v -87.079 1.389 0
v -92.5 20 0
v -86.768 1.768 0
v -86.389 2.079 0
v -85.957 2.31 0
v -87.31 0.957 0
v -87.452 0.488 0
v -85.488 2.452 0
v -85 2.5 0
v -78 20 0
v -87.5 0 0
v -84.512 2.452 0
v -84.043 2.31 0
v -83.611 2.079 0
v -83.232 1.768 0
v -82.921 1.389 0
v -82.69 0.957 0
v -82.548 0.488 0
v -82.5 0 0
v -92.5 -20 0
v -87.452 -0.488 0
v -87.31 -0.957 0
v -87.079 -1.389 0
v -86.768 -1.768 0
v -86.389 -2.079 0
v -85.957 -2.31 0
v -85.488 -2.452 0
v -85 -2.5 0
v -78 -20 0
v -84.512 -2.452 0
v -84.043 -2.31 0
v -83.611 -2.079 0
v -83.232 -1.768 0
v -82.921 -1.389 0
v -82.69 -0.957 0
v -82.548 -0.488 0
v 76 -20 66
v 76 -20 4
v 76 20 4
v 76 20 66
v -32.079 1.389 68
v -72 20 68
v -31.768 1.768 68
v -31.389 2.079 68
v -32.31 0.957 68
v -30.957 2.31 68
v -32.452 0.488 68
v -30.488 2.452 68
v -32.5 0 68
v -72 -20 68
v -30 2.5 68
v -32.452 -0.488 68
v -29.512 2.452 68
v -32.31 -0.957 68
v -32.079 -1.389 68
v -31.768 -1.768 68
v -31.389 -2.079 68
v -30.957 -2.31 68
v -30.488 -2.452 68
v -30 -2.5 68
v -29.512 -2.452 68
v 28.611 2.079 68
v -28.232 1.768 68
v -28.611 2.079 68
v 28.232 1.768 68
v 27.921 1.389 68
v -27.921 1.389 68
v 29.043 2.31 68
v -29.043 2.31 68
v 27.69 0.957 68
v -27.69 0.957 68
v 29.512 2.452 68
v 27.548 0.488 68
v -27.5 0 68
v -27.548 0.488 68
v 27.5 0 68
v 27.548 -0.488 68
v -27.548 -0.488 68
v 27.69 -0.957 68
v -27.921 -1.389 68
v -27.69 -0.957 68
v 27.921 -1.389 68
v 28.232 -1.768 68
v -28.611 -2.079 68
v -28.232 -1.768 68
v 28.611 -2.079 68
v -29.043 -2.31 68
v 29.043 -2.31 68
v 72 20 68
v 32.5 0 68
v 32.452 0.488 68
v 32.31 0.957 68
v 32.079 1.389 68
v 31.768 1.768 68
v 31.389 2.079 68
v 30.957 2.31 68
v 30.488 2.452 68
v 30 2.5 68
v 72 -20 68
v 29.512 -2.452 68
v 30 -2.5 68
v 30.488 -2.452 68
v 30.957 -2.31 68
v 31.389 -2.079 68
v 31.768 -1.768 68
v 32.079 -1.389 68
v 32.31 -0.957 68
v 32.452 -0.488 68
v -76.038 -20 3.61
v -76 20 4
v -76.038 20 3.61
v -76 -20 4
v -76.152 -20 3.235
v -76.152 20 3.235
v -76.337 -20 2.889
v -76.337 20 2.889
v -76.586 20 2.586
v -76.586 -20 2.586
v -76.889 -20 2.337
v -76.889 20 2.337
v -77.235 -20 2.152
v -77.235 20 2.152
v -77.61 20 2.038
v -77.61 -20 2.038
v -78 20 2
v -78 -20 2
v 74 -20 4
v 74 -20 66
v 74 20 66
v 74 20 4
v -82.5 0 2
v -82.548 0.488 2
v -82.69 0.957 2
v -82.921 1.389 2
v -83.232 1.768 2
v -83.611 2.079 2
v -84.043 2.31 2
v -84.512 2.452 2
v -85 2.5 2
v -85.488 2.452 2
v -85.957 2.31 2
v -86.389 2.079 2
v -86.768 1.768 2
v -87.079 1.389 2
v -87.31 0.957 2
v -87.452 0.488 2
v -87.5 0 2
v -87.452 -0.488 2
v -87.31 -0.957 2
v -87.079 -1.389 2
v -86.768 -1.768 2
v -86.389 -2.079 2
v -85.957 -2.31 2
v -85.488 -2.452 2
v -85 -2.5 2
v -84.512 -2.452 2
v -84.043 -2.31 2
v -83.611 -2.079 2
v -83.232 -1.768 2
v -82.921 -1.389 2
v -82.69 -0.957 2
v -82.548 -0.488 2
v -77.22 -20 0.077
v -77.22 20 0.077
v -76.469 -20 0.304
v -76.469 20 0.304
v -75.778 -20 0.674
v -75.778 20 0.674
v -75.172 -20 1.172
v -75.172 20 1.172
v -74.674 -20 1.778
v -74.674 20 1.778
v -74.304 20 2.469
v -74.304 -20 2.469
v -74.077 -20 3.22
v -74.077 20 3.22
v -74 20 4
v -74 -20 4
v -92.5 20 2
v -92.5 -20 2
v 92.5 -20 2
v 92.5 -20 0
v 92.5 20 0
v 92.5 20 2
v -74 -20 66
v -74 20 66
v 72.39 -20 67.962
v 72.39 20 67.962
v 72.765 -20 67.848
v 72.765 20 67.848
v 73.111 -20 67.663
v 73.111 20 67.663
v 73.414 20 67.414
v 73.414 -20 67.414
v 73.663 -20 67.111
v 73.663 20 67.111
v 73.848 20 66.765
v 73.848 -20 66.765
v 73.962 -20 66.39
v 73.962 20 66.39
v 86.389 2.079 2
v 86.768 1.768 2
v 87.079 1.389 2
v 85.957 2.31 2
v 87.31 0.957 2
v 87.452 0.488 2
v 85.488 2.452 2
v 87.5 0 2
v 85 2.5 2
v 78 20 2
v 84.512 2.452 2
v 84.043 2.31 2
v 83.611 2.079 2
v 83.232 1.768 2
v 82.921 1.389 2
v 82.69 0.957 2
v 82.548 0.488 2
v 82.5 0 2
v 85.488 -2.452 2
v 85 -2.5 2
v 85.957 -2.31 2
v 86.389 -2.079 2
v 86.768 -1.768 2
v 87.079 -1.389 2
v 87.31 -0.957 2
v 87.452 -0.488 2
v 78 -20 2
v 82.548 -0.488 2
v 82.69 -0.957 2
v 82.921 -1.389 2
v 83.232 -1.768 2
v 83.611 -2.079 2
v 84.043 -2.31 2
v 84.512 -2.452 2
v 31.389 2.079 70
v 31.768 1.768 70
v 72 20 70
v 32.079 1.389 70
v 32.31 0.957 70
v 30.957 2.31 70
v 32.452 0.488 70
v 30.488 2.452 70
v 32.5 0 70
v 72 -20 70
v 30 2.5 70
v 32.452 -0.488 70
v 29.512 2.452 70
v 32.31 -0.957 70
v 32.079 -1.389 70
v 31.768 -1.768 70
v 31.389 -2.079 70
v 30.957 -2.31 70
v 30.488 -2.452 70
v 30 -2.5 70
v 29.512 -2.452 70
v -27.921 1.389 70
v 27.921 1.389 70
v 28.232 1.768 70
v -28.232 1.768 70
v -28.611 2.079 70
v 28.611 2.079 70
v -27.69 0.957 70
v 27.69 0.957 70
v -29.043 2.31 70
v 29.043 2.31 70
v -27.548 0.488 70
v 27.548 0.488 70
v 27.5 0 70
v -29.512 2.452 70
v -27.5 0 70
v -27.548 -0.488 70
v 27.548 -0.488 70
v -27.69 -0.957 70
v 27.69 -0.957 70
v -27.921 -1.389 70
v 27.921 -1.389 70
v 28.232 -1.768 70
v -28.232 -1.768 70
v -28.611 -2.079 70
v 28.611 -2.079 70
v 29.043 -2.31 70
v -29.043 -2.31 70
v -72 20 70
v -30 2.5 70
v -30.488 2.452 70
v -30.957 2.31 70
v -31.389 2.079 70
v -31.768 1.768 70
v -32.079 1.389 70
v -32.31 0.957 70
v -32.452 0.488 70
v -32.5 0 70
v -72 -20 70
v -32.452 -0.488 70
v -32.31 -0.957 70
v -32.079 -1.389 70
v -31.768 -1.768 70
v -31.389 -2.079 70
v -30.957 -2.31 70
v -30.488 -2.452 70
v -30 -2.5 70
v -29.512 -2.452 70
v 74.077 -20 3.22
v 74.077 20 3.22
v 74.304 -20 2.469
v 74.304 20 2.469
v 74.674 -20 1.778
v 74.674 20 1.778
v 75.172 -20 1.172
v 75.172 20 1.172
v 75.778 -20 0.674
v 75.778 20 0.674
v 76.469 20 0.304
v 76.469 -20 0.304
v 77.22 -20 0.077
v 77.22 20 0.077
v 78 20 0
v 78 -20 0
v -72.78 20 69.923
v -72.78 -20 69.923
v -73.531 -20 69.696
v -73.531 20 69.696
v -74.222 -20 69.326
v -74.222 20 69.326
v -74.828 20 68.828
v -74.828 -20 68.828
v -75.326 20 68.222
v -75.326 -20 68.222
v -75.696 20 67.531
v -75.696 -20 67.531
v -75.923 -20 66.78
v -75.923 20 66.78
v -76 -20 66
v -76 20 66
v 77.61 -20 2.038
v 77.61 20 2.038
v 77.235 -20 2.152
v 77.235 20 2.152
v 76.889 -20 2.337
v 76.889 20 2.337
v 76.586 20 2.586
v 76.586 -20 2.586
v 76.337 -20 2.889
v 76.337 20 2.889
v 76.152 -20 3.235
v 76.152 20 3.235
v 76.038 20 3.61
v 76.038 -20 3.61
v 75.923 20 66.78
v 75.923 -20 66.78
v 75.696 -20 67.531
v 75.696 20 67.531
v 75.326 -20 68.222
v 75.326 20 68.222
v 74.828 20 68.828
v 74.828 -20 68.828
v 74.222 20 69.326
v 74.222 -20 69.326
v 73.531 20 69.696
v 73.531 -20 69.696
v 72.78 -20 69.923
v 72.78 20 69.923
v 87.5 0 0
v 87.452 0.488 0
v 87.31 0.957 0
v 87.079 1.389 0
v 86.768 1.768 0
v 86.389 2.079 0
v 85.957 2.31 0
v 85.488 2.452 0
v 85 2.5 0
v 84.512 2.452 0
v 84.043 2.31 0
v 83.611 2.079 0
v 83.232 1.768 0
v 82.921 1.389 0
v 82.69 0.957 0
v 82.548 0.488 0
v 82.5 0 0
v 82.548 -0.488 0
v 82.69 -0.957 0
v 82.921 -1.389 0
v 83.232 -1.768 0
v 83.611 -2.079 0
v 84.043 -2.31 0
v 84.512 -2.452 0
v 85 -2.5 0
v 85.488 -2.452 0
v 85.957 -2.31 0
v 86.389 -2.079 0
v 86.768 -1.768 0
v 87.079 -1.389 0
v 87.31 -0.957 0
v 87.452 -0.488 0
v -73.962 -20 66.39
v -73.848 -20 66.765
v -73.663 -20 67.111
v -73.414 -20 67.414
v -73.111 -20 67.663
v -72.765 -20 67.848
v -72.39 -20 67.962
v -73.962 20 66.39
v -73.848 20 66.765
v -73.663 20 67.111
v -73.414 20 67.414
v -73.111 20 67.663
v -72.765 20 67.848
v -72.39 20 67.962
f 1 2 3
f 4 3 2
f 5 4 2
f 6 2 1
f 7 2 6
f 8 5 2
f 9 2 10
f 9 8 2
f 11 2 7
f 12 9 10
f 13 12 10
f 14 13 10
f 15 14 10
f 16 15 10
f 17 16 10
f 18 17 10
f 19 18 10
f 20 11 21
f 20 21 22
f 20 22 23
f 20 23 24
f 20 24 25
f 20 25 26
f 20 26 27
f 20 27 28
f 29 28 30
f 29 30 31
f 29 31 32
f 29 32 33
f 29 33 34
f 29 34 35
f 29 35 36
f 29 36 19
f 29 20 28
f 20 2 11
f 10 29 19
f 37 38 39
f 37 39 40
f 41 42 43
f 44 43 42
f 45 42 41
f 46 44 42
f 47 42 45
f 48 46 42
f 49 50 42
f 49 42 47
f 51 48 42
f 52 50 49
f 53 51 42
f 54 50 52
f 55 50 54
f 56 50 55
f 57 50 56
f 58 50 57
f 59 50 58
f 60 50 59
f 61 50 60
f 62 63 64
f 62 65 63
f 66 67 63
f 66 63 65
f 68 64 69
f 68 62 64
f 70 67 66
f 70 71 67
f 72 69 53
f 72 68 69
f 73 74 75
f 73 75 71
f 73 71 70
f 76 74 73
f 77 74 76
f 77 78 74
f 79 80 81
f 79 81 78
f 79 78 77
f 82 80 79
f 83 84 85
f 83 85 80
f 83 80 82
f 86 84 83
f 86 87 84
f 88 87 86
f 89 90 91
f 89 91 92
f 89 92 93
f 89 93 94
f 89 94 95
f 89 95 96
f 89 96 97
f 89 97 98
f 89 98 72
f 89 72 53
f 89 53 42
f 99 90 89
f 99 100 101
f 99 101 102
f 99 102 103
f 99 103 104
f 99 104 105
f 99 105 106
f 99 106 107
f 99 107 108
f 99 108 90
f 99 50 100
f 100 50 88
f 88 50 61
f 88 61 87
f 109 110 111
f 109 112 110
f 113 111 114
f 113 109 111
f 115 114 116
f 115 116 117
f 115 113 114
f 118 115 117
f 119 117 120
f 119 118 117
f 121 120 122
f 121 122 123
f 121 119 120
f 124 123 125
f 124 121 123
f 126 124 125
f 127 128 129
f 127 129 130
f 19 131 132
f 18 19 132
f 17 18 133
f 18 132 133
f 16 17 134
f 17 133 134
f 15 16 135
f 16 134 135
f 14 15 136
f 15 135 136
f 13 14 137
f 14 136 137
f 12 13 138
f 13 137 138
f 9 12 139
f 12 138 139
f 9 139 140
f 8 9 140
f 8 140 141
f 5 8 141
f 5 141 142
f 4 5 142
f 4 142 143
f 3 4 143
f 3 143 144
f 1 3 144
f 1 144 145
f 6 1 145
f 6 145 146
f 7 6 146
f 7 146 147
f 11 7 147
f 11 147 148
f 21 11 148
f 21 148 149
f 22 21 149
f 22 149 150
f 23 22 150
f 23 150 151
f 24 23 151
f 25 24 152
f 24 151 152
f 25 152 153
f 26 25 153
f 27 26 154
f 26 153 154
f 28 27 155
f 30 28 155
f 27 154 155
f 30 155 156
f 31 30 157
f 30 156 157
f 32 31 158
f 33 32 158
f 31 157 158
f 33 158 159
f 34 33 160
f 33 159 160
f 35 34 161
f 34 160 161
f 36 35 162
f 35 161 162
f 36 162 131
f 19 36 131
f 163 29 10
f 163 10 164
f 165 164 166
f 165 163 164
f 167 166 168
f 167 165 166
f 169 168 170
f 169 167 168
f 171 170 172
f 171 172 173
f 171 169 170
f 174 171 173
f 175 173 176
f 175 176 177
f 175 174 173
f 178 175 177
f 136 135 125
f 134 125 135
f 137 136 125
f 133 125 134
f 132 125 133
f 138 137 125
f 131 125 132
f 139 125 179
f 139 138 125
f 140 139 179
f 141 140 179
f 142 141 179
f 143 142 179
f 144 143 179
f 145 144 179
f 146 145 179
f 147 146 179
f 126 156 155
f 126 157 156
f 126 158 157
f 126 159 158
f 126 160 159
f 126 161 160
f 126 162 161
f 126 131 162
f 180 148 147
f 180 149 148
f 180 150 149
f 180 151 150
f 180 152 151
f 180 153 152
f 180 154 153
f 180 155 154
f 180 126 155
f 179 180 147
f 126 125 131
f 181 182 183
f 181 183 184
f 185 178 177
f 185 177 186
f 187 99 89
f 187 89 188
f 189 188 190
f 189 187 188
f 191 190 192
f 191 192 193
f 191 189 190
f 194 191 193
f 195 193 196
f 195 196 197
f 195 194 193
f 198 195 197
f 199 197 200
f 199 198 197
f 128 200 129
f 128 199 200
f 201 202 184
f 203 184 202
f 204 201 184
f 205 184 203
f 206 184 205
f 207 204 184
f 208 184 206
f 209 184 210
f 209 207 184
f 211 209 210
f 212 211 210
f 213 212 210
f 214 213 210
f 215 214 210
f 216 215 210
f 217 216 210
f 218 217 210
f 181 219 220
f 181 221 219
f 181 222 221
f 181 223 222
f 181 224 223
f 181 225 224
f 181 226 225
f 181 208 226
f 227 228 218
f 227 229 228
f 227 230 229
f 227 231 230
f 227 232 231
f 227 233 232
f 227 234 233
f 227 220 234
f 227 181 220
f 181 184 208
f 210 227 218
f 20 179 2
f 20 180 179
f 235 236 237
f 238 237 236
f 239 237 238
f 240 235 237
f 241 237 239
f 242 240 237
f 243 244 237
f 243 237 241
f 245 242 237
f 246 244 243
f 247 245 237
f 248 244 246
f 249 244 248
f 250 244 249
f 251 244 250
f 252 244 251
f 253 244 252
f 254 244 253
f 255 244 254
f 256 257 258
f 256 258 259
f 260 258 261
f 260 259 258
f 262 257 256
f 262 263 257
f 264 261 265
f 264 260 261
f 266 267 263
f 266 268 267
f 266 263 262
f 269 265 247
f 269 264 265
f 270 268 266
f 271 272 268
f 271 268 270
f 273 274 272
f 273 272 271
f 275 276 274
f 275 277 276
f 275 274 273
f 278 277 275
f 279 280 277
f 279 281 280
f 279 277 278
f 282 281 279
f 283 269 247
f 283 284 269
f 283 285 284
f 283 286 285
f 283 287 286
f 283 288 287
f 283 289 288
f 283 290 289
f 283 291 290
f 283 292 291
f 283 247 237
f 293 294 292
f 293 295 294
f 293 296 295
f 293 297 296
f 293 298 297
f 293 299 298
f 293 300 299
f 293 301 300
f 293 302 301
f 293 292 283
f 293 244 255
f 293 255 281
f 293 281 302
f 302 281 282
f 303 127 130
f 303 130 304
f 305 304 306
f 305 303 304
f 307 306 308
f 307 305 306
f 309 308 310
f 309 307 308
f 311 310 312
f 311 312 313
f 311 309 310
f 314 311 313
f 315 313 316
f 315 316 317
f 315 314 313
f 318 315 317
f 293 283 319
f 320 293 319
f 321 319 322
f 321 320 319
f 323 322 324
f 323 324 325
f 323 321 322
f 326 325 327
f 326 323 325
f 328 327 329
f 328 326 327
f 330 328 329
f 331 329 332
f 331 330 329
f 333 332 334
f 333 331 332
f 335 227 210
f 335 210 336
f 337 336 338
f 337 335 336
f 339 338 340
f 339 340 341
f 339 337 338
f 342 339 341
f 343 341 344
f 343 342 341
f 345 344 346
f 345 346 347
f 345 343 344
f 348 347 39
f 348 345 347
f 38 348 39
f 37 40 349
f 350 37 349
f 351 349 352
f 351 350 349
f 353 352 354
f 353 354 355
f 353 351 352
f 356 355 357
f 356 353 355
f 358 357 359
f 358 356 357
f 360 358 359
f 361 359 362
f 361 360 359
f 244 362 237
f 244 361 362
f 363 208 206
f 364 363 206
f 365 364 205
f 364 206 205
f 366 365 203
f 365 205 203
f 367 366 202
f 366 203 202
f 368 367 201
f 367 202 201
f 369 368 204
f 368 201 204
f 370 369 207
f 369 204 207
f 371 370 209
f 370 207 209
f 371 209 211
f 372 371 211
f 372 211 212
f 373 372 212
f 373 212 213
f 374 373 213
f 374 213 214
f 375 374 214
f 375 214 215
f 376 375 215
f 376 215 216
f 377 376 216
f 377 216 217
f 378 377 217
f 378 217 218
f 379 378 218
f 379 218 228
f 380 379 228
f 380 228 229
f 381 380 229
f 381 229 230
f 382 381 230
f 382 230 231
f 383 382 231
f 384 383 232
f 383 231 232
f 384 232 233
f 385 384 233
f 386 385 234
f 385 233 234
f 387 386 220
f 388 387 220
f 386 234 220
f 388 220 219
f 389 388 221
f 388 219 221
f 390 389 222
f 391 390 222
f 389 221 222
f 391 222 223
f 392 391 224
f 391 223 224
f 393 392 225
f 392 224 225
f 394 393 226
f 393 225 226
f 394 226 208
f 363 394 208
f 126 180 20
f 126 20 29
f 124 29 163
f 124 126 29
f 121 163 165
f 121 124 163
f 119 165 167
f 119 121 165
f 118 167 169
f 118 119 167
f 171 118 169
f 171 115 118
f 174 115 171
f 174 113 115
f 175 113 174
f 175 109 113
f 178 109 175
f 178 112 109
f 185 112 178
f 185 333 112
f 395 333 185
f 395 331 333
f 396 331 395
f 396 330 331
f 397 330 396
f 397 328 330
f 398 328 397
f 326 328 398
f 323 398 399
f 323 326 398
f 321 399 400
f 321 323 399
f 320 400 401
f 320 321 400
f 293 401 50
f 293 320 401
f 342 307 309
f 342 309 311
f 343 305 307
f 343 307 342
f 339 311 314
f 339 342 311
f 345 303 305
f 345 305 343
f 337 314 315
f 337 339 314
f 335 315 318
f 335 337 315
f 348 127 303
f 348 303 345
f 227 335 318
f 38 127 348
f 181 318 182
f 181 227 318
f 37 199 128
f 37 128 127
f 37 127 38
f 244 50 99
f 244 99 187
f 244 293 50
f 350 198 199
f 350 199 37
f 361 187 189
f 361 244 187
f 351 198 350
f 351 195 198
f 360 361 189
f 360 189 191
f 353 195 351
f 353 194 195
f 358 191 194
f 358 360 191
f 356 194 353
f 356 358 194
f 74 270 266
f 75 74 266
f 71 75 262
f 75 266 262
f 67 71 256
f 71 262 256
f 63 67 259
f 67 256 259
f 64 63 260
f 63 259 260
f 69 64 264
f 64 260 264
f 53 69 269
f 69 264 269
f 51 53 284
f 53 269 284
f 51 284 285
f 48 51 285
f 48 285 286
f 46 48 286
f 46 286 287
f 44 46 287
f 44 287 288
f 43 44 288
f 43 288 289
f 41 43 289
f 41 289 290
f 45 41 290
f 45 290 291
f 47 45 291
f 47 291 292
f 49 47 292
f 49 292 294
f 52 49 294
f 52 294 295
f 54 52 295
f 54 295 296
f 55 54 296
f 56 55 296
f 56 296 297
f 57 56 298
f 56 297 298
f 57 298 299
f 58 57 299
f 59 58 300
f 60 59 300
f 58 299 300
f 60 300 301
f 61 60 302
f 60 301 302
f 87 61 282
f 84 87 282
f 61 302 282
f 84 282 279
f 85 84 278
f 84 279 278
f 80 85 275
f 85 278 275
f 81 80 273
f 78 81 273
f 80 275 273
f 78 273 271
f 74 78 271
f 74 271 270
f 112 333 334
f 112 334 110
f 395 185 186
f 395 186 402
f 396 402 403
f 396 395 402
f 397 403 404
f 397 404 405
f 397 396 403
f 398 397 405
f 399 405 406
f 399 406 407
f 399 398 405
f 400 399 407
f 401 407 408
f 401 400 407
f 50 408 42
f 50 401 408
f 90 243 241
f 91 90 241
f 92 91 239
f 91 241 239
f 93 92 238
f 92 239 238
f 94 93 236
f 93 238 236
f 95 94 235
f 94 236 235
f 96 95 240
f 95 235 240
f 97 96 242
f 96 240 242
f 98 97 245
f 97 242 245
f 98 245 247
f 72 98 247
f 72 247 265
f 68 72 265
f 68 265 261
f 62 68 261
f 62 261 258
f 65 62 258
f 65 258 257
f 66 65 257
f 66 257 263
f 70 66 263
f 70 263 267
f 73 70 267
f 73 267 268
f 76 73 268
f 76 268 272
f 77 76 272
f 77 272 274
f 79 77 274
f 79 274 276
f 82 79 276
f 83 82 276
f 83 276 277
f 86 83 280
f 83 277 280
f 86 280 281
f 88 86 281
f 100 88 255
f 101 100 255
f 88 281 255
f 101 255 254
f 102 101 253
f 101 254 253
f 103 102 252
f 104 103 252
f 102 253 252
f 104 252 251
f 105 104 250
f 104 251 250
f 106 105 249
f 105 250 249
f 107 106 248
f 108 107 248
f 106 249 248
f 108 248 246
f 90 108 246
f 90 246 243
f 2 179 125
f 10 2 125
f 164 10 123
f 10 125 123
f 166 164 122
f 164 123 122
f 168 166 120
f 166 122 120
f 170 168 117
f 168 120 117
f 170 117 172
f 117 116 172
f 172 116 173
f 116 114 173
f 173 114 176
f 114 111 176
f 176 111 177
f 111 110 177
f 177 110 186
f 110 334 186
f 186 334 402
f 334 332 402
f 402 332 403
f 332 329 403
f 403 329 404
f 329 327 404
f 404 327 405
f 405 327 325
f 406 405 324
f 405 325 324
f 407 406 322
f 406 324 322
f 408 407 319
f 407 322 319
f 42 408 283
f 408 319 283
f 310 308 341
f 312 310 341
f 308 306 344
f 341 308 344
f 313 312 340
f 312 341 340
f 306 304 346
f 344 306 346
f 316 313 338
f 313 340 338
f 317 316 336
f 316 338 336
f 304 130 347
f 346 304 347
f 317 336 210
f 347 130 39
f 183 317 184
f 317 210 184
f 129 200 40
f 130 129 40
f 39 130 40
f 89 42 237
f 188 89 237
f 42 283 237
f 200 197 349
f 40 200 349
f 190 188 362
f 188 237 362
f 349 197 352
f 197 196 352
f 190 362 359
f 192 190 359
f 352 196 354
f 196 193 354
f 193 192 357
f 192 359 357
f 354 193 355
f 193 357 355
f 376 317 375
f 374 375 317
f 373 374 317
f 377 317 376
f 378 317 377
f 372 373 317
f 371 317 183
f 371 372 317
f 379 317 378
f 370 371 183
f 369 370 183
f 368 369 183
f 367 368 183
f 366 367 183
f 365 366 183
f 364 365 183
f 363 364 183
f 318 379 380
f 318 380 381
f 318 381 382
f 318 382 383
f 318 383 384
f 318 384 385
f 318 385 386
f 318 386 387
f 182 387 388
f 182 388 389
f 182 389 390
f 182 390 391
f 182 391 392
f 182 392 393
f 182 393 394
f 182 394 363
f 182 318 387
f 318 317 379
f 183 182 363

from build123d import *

# Parameters (mm, degrees)
F1_DEPTH = 20
F2_R     = 2.5
F3_DEPTH = 2.001
F4_R     = 2.5
F5_DEPTH = 25


with BuildPart() as f1:
    # F0 (on Front) → F1 (new body, symmetric)
    with BuildSketch(Plane.XZ):
        with BuildLine():
            Line((-92.5, 2), (-92.5, 0))
            Line((-92.5, 0), (-78, 0))
            ThreePointArc((-78, 0), (-75.171573, 1.171573), (-74, 4))
            Line((-74, 4), (-74, 66))
            ThreePointArc((-74, 66), (-73.414214, 67.414214), (-72, 68))
            Line((-72, 68), (0, 68))
            Line((0, 68), (72, 68))
            ThreePointArc((72, 68), (73.414214, 67.414214), (74, 66))
            Line((74, 66), (74, 4))
            ThreePointArc((74, 4), (75.171573, 1.171573), (78, 0))
            Line((78, 0), (92.5, 0))
            Line((92.5, 0), (92.5, 2))
            Line((92.5, 2), (78, 2))
            ThreePointArc((78, 2), (76.585786, 2.585786), (76, 4))
            Line((76, 4), (76, 66))
            ThreePointArc((76, 66), (74.828427, 68.828427), (72, 70))
            Line((72, 70), (0, 70))
            Line((0, 70), (-72, 70))
            ThreePointArc((-72, 70), (-74.828427, 68.828427), (-76, 66))
            Line((-76, 66), (-76, 4))
            ThreePointArc((-76, 4), (-76.585786, 2.585786), (-78, 2))
            Line((-78, 2), (-92.5, 2))
        make_face()
    extrude(amount=F1_DEPTH, both=True)

    # F2 (on face) → F3 (cut, through all)
    with BuildSketch(Plane.XY.offset(2)):
        with Locations((-85, 0)):
            Circle(F2_R)
        with Locations((85, 0)):
            Circle(F2_R)
    extrude(amount=-F3_DEPTH, mode=Mode.SUBTRACT)

    # F4 (on face) → F5 (cut)
    with BuildSketch(Plane.XY.offset(70)):
        with Locations((-30, 0)):
            Circle(F4_R)
        with Locations((30, 0)):
            Circle(F4_R)
    extrude(amount=-F5_DEPTH, mode=Mode.SUBTRACT)


solid = f1.part
